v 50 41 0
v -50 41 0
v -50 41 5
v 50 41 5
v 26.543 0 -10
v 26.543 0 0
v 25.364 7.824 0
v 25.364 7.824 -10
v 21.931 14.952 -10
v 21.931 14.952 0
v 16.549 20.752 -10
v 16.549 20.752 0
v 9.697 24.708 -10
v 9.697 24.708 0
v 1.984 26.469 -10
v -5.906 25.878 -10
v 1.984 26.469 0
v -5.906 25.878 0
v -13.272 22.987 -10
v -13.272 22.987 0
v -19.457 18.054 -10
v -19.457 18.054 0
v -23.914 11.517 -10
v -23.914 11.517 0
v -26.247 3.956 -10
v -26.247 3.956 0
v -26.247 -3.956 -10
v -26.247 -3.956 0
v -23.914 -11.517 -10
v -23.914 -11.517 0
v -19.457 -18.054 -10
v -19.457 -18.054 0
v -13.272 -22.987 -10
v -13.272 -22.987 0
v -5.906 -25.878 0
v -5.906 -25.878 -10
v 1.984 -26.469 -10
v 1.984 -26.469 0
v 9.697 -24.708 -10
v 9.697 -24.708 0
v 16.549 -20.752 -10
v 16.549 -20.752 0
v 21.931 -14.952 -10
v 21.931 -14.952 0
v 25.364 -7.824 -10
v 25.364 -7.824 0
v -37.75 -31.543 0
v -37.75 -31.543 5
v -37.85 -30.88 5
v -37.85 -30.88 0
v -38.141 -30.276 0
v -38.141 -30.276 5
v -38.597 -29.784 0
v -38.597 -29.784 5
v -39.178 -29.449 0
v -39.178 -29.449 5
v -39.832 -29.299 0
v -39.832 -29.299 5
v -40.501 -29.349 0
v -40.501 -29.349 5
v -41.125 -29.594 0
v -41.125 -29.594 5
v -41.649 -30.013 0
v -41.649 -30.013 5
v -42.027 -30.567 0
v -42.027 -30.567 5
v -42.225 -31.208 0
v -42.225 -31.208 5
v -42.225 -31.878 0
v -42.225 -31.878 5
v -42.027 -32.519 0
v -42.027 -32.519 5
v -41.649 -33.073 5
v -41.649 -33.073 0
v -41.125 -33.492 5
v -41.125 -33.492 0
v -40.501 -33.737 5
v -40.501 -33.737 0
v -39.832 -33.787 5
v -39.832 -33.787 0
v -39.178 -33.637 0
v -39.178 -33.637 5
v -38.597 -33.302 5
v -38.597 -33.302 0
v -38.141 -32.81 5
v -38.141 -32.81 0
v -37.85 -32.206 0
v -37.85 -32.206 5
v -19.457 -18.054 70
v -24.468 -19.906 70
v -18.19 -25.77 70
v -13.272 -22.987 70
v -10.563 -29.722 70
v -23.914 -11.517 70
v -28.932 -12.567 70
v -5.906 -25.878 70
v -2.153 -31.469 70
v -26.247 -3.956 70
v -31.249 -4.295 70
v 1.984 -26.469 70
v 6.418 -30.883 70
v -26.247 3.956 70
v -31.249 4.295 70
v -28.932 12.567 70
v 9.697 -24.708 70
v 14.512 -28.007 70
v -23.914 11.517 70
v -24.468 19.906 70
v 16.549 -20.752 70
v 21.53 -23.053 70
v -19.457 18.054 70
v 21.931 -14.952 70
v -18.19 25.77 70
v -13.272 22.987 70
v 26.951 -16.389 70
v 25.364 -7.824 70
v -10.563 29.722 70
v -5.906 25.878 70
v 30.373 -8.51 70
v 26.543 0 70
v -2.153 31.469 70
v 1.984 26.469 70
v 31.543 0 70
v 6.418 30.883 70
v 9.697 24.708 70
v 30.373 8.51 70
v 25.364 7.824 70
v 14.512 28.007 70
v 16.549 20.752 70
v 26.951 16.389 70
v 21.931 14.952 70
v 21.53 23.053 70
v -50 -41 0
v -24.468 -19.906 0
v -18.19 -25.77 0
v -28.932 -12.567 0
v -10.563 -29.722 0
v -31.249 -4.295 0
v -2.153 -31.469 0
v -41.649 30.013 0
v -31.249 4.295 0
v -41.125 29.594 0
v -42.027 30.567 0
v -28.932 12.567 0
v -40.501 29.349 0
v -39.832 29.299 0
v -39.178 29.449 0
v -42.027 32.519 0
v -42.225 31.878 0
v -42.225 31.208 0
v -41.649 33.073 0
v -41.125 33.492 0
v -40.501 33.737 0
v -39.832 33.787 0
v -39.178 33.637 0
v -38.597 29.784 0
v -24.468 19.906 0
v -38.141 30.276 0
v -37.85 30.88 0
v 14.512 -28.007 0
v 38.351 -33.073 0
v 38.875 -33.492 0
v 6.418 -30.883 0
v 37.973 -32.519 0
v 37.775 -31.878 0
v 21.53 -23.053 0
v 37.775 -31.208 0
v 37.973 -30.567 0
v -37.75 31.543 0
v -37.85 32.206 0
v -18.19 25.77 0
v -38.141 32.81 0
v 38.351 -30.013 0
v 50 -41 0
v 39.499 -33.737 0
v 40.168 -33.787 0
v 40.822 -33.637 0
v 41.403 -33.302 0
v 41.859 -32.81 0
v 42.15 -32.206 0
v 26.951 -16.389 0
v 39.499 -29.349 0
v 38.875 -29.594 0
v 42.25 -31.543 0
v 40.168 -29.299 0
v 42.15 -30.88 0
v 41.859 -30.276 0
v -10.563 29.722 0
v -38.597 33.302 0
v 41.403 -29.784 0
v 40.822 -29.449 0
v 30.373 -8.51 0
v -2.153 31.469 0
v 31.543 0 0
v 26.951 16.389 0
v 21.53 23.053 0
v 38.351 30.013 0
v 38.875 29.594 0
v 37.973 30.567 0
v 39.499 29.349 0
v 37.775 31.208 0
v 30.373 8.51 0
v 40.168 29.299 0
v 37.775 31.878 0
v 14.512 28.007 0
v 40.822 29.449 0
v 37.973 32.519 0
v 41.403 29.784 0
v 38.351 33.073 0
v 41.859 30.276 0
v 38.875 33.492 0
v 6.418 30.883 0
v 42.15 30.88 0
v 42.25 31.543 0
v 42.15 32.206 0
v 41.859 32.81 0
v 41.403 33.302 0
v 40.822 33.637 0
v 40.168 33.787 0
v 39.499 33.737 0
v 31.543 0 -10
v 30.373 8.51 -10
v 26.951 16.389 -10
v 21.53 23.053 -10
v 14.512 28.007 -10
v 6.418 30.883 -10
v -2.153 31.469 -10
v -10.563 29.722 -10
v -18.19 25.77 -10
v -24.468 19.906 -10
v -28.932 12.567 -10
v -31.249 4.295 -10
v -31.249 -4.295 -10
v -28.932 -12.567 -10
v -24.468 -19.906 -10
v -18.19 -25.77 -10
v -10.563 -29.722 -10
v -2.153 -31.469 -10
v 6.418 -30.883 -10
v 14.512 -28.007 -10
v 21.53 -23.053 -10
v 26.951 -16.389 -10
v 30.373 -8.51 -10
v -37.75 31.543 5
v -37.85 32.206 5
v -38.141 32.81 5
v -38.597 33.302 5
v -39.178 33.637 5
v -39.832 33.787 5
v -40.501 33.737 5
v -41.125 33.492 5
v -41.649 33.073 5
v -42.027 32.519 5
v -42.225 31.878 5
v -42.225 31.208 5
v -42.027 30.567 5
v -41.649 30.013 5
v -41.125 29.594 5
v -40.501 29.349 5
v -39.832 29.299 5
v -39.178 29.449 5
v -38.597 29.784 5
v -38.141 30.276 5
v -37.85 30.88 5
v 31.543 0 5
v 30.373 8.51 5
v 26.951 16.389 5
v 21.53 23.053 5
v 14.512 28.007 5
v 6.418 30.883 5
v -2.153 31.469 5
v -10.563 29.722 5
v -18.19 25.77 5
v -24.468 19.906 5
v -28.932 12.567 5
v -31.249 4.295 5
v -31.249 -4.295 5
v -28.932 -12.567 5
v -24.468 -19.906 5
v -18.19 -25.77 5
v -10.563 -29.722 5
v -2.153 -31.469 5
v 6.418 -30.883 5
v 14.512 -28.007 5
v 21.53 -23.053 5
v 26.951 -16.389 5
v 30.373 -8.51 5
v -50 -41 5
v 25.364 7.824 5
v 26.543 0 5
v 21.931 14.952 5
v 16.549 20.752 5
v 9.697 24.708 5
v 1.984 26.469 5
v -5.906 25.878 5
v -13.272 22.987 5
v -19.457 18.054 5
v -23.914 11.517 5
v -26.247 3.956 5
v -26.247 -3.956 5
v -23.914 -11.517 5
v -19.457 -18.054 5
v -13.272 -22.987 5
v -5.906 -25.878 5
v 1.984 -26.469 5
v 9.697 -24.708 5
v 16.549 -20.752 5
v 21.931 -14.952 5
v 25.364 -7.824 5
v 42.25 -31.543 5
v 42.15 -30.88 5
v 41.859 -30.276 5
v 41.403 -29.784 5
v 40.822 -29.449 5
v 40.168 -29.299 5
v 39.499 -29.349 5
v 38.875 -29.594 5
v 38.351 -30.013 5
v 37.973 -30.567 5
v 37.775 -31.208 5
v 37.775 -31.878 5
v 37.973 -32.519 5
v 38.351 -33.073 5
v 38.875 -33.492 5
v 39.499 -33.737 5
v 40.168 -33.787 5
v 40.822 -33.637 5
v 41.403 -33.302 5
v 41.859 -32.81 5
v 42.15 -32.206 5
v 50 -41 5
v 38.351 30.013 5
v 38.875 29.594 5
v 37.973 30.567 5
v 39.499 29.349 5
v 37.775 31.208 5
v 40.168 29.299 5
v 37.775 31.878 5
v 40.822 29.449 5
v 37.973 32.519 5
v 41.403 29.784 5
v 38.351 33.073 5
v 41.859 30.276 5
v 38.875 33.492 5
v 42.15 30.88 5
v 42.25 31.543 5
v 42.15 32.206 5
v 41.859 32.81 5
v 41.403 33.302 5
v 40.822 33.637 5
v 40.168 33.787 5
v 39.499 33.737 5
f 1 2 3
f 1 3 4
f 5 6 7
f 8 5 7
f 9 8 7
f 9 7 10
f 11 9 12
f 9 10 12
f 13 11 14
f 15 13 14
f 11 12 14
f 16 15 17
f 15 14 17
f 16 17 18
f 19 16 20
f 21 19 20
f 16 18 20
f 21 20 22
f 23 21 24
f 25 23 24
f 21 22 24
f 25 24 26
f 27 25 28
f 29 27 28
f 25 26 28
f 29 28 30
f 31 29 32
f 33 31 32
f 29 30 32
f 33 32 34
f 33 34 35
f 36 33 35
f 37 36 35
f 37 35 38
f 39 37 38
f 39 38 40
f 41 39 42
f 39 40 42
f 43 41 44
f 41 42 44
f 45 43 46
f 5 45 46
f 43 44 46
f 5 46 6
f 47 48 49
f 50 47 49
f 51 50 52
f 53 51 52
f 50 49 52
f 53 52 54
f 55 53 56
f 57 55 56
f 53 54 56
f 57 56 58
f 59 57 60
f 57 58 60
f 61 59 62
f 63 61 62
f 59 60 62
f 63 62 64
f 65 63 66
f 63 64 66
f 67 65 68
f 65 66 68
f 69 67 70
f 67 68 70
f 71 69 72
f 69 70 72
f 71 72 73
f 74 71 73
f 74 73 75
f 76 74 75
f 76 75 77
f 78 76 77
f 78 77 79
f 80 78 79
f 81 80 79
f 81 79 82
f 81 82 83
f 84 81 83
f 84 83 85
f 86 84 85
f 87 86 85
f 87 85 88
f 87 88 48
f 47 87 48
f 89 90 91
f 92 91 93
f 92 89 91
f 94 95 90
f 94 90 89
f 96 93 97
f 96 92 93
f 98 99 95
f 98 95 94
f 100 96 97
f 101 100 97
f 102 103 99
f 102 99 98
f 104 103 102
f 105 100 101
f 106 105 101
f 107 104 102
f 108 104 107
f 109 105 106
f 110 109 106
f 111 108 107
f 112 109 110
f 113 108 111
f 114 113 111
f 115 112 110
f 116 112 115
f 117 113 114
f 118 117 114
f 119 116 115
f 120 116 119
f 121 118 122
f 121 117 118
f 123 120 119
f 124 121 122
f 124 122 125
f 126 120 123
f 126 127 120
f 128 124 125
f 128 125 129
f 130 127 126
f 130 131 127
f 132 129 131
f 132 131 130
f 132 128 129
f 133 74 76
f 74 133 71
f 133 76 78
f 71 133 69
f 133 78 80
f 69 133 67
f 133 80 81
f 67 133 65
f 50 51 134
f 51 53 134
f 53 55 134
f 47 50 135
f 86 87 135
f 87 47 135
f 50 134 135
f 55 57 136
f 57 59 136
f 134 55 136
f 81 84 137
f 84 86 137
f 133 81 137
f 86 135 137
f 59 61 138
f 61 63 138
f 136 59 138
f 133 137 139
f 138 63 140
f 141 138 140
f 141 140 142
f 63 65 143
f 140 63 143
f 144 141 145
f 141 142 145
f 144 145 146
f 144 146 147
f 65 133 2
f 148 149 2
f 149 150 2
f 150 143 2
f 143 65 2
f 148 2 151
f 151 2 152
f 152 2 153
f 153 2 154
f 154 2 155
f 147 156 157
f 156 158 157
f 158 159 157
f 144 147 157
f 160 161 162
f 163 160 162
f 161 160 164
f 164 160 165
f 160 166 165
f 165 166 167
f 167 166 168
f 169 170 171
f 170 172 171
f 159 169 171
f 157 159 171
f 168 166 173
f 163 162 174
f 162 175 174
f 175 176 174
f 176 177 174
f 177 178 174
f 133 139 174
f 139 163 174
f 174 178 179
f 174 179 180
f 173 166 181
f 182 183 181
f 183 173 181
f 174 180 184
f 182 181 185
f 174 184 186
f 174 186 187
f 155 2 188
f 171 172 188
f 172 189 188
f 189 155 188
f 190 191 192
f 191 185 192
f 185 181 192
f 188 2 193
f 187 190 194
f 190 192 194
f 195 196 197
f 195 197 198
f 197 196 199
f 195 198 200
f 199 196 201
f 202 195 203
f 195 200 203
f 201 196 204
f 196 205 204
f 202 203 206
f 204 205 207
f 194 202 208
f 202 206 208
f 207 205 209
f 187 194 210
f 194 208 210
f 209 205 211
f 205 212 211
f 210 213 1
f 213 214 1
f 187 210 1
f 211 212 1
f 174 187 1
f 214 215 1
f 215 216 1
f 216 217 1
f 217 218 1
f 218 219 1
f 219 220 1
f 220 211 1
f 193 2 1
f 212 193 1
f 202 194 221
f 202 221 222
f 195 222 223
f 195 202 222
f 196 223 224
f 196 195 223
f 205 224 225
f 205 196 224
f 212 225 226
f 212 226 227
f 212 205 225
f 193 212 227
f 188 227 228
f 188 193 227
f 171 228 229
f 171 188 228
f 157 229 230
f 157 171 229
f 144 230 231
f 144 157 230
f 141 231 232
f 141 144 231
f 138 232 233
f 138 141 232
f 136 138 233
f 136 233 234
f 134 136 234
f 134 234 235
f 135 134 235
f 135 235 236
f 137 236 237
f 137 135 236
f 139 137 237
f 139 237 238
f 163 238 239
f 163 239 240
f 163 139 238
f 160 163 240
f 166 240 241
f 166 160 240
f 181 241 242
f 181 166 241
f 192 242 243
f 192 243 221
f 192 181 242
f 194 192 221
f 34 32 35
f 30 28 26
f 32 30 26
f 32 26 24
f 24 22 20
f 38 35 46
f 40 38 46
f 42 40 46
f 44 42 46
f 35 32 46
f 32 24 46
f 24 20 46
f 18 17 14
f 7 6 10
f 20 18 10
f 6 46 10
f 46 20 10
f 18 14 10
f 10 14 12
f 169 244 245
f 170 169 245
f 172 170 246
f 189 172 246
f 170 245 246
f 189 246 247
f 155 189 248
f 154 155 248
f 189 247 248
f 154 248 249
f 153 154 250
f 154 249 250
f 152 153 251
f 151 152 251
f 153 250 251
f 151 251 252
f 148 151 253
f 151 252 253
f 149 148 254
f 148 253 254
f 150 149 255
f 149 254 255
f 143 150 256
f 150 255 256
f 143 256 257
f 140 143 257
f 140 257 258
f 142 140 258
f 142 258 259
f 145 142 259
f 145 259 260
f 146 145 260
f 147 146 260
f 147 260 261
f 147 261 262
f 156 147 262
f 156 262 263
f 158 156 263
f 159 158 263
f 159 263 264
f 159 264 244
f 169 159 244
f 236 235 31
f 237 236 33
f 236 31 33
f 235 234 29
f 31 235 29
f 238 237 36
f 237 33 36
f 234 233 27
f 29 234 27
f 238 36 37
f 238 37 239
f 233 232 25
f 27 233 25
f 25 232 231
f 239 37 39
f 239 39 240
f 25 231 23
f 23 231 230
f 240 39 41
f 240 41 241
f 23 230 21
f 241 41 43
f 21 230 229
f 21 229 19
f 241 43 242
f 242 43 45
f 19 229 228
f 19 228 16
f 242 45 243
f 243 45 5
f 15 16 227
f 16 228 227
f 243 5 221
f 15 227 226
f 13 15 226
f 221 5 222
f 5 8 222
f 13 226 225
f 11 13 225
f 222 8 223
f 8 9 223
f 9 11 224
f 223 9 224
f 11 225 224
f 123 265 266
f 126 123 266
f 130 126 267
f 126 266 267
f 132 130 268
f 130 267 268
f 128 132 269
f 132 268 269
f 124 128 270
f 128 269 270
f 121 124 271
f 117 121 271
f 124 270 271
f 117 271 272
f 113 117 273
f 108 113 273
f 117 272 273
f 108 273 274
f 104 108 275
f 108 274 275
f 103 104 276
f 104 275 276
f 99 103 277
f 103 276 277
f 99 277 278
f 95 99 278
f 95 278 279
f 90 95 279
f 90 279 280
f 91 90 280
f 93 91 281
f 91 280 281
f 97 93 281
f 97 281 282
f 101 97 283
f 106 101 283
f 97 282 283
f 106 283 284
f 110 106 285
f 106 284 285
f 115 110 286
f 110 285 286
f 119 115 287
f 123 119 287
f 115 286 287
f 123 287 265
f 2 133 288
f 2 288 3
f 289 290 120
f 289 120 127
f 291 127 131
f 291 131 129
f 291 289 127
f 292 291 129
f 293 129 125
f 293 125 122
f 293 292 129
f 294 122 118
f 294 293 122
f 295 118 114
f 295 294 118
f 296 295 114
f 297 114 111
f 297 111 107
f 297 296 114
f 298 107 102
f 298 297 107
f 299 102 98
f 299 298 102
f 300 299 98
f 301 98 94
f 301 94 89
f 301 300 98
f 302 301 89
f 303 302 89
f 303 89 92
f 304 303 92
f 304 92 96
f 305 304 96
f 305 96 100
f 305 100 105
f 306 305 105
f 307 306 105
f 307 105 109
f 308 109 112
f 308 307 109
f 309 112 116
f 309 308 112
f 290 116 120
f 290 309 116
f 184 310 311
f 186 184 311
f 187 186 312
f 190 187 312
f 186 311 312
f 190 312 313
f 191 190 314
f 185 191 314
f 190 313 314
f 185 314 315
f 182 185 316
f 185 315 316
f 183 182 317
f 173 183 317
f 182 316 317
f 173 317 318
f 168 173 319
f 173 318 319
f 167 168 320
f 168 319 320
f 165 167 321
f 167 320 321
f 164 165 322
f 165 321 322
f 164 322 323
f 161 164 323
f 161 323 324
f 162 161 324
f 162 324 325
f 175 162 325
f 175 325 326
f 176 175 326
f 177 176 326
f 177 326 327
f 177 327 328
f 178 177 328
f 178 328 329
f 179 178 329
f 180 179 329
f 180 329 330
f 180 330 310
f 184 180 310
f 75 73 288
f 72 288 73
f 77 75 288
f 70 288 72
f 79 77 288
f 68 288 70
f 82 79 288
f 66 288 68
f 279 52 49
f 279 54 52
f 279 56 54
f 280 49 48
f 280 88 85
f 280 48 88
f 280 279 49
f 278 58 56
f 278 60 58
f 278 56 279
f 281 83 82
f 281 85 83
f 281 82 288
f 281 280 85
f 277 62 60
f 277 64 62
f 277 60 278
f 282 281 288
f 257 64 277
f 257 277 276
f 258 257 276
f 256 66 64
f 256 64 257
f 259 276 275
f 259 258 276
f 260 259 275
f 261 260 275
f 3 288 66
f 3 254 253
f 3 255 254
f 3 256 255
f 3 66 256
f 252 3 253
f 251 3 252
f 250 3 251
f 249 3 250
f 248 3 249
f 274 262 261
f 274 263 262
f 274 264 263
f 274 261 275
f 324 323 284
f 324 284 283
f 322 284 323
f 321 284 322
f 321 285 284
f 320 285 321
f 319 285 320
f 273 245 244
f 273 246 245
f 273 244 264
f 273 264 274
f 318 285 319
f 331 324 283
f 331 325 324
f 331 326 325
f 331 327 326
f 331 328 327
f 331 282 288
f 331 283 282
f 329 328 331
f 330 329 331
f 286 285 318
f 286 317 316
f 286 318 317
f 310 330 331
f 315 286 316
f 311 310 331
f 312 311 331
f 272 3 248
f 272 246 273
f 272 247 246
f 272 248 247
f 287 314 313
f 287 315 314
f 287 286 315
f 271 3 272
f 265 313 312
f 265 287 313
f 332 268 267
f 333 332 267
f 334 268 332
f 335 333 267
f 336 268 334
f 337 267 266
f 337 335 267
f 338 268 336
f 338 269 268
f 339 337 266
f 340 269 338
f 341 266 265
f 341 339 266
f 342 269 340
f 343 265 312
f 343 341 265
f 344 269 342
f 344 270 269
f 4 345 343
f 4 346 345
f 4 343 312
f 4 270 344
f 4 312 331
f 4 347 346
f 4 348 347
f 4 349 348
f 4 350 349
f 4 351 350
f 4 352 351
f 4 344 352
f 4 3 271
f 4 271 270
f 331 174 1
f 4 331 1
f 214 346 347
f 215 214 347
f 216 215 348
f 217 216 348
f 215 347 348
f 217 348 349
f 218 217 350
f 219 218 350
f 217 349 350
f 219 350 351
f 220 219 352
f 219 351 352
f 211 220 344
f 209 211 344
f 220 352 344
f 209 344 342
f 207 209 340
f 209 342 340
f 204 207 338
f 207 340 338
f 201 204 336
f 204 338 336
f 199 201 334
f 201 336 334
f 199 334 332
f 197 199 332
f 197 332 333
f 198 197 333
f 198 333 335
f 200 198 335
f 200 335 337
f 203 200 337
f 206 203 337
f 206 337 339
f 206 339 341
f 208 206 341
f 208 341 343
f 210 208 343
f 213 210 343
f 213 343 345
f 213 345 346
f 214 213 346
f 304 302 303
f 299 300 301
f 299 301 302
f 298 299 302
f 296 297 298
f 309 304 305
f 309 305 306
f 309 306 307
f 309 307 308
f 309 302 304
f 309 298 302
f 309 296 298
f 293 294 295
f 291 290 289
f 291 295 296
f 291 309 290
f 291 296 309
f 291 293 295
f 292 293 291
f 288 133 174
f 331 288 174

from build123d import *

# Parameters (mm, degrees)
SKETCH1_R                = 31.543
SKETCH1_R_2              = 26.543
BOSS_EXTRUDE1_DEPTH      = 10
SKETCH2_W                = 100
SKETCH2_H                = 82
BOSS_EXTRUDE2_DEPTH      = 5
M4_CLEARANCE_HOLE2_D     = 4.5
M4_CLEARANCE_HOLE2_DEPTH = 5
SKETCH8_R                = 31.543
SKETCH8_R_2              = 26.543
BOSS_EXTRUDE3_DEPTH      = 65


with BuildPart() as part:
    # Sketch1 → Boss-Extrude1 (new body)
    with BuildSketch(Plane.XY):
        Circle(SKETCH1_R)
        Circle(SKETCH1_R_2, mode=Mode.SUBTRACT)
    extrude(amount=-BOSS_EXTRUDE1_DEPTH)

    # Sketch2 → Boss-Extrude2 (add)
    with BuildSketch(Plane.XY):
        Rectangle(SKETCH2_W, SKETCH2_H)
    extrude(amount=BOSS_EXTRUDE2_DEPTH)

    # M4 Clearance Hole2
    with Locations(Plane(origin=(0, 0, 0), x_dir=(-1, 0, 0), z_dir=(0, 0, -1))):
        with Locations((-40, 31.543), (40, 31.543), (40, -31.543), (-40, -31.543)):
            Hole(M4_CLEARANCE_HOLE2_D / 2, depth=M4_CLEARANCE_HOLE2_DEPTH)

    # Sketch8 → Boss-Extrude3 (add)
    with BuildSketch(Plane.XY.offset(5)):
        Circle(SKETCH8_R)
        Circle(SKETCH8_R_2, mode=Mode.SUBTRACT)
    extrude(amount=BOSS_EXTRUDE3_DEPTH)


solid = part.part
